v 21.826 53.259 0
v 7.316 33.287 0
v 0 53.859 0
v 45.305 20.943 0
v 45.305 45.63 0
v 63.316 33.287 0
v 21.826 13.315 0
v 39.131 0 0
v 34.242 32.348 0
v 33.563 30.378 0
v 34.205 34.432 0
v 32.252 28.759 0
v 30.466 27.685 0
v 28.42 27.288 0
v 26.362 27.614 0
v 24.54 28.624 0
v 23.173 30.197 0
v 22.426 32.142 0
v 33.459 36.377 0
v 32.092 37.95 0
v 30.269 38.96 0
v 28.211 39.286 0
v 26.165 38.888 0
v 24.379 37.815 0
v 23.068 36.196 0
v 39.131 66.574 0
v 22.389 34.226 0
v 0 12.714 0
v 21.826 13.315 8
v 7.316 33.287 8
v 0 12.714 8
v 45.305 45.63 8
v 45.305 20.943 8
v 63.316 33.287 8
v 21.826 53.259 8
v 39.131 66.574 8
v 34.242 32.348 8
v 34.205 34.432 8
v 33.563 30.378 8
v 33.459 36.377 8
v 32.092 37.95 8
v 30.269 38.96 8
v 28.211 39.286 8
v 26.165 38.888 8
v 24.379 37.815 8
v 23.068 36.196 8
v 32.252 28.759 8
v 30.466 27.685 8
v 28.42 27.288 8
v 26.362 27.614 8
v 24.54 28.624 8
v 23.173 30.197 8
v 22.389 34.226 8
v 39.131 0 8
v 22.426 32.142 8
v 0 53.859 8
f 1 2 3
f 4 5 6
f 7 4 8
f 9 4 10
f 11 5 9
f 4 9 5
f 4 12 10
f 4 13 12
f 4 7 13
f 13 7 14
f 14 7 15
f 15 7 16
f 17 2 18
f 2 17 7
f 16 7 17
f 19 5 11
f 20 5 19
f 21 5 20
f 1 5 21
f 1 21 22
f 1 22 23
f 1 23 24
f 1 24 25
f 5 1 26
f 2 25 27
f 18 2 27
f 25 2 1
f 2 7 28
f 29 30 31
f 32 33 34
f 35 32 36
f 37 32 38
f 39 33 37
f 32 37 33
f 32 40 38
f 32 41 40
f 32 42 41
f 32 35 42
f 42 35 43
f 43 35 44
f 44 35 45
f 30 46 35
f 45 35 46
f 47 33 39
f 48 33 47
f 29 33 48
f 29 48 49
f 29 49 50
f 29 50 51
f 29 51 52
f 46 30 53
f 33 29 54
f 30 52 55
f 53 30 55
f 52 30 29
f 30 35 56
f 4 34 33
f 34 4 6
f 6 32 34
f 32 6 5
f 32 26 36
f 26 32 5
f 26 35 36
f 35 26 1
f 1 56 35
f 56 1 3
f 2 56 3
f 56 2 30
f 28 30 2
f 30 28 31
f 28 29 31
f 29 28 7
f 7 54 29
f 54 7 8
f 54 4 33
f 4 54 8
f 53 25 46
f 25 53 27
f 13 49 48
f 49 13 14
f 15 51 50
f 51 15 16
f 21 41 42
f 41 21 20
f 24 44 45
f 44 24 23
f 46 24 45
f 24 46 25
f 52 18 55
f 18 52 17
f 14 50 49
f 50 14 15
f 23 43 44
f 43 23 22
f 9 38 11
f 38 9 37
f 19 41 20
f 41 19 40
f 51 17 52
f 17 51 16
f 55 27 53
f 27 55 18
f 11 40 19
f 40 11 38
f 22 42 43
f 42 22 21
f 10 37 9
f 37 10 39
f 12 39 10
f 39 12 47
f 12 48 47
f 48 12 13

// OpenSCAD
$fn = 32;

// ----------------------------------------------------------------------
// Star wheel: 5-point blunt, R35
// ----------------------------------------------------------------------

// --- parameters (mm) ---
n_points = 5;             // number of points / teeth
r_out = 35;               // tip radius
r_in = 21;                // root radius
bore_r = 6;               // centre bore radius
plate_t = 8;              // plate thickness, Z (extrusion height)
bore_d = 12;              // centre bore diameter

profile = [[63.316, 33.287], [45.305, 45.63], [39.131, 66.574], [21.826, 53.259], [0, 53.859], [7.316, 33.287], [0, 12.714], [21.826, 13.315], [39.131, 0], [45.305, 20.943]];  // primary outline, 10 points, counter clockwise
void_1 = [[34.205, 34.432], [33.459, 36.377], [32.092, 37.95], [30.269, 38.96], [28.211, 39.286], [26.165, 38.888], [24.379, 37.815], [23.068, 36.196], [22.389, 34.226], [22.426, 32.142], [23.173, 30.197], [24.54, 28.624], [26.362, 27.614], [28.42, 27.288], [30.466, 27.685], [32.252, 28.759], [33.563, 30.378], [34.242, 32.348]];  // centre bore, 18 points

// --- the one profile operation ---
difference() {
  linear_extrude(height = plate_t) polygon(points = profile);
  translate([0, 0, -1])
    linear_extrude(height = plate_t + 2) polygon(points = void_1);
}
